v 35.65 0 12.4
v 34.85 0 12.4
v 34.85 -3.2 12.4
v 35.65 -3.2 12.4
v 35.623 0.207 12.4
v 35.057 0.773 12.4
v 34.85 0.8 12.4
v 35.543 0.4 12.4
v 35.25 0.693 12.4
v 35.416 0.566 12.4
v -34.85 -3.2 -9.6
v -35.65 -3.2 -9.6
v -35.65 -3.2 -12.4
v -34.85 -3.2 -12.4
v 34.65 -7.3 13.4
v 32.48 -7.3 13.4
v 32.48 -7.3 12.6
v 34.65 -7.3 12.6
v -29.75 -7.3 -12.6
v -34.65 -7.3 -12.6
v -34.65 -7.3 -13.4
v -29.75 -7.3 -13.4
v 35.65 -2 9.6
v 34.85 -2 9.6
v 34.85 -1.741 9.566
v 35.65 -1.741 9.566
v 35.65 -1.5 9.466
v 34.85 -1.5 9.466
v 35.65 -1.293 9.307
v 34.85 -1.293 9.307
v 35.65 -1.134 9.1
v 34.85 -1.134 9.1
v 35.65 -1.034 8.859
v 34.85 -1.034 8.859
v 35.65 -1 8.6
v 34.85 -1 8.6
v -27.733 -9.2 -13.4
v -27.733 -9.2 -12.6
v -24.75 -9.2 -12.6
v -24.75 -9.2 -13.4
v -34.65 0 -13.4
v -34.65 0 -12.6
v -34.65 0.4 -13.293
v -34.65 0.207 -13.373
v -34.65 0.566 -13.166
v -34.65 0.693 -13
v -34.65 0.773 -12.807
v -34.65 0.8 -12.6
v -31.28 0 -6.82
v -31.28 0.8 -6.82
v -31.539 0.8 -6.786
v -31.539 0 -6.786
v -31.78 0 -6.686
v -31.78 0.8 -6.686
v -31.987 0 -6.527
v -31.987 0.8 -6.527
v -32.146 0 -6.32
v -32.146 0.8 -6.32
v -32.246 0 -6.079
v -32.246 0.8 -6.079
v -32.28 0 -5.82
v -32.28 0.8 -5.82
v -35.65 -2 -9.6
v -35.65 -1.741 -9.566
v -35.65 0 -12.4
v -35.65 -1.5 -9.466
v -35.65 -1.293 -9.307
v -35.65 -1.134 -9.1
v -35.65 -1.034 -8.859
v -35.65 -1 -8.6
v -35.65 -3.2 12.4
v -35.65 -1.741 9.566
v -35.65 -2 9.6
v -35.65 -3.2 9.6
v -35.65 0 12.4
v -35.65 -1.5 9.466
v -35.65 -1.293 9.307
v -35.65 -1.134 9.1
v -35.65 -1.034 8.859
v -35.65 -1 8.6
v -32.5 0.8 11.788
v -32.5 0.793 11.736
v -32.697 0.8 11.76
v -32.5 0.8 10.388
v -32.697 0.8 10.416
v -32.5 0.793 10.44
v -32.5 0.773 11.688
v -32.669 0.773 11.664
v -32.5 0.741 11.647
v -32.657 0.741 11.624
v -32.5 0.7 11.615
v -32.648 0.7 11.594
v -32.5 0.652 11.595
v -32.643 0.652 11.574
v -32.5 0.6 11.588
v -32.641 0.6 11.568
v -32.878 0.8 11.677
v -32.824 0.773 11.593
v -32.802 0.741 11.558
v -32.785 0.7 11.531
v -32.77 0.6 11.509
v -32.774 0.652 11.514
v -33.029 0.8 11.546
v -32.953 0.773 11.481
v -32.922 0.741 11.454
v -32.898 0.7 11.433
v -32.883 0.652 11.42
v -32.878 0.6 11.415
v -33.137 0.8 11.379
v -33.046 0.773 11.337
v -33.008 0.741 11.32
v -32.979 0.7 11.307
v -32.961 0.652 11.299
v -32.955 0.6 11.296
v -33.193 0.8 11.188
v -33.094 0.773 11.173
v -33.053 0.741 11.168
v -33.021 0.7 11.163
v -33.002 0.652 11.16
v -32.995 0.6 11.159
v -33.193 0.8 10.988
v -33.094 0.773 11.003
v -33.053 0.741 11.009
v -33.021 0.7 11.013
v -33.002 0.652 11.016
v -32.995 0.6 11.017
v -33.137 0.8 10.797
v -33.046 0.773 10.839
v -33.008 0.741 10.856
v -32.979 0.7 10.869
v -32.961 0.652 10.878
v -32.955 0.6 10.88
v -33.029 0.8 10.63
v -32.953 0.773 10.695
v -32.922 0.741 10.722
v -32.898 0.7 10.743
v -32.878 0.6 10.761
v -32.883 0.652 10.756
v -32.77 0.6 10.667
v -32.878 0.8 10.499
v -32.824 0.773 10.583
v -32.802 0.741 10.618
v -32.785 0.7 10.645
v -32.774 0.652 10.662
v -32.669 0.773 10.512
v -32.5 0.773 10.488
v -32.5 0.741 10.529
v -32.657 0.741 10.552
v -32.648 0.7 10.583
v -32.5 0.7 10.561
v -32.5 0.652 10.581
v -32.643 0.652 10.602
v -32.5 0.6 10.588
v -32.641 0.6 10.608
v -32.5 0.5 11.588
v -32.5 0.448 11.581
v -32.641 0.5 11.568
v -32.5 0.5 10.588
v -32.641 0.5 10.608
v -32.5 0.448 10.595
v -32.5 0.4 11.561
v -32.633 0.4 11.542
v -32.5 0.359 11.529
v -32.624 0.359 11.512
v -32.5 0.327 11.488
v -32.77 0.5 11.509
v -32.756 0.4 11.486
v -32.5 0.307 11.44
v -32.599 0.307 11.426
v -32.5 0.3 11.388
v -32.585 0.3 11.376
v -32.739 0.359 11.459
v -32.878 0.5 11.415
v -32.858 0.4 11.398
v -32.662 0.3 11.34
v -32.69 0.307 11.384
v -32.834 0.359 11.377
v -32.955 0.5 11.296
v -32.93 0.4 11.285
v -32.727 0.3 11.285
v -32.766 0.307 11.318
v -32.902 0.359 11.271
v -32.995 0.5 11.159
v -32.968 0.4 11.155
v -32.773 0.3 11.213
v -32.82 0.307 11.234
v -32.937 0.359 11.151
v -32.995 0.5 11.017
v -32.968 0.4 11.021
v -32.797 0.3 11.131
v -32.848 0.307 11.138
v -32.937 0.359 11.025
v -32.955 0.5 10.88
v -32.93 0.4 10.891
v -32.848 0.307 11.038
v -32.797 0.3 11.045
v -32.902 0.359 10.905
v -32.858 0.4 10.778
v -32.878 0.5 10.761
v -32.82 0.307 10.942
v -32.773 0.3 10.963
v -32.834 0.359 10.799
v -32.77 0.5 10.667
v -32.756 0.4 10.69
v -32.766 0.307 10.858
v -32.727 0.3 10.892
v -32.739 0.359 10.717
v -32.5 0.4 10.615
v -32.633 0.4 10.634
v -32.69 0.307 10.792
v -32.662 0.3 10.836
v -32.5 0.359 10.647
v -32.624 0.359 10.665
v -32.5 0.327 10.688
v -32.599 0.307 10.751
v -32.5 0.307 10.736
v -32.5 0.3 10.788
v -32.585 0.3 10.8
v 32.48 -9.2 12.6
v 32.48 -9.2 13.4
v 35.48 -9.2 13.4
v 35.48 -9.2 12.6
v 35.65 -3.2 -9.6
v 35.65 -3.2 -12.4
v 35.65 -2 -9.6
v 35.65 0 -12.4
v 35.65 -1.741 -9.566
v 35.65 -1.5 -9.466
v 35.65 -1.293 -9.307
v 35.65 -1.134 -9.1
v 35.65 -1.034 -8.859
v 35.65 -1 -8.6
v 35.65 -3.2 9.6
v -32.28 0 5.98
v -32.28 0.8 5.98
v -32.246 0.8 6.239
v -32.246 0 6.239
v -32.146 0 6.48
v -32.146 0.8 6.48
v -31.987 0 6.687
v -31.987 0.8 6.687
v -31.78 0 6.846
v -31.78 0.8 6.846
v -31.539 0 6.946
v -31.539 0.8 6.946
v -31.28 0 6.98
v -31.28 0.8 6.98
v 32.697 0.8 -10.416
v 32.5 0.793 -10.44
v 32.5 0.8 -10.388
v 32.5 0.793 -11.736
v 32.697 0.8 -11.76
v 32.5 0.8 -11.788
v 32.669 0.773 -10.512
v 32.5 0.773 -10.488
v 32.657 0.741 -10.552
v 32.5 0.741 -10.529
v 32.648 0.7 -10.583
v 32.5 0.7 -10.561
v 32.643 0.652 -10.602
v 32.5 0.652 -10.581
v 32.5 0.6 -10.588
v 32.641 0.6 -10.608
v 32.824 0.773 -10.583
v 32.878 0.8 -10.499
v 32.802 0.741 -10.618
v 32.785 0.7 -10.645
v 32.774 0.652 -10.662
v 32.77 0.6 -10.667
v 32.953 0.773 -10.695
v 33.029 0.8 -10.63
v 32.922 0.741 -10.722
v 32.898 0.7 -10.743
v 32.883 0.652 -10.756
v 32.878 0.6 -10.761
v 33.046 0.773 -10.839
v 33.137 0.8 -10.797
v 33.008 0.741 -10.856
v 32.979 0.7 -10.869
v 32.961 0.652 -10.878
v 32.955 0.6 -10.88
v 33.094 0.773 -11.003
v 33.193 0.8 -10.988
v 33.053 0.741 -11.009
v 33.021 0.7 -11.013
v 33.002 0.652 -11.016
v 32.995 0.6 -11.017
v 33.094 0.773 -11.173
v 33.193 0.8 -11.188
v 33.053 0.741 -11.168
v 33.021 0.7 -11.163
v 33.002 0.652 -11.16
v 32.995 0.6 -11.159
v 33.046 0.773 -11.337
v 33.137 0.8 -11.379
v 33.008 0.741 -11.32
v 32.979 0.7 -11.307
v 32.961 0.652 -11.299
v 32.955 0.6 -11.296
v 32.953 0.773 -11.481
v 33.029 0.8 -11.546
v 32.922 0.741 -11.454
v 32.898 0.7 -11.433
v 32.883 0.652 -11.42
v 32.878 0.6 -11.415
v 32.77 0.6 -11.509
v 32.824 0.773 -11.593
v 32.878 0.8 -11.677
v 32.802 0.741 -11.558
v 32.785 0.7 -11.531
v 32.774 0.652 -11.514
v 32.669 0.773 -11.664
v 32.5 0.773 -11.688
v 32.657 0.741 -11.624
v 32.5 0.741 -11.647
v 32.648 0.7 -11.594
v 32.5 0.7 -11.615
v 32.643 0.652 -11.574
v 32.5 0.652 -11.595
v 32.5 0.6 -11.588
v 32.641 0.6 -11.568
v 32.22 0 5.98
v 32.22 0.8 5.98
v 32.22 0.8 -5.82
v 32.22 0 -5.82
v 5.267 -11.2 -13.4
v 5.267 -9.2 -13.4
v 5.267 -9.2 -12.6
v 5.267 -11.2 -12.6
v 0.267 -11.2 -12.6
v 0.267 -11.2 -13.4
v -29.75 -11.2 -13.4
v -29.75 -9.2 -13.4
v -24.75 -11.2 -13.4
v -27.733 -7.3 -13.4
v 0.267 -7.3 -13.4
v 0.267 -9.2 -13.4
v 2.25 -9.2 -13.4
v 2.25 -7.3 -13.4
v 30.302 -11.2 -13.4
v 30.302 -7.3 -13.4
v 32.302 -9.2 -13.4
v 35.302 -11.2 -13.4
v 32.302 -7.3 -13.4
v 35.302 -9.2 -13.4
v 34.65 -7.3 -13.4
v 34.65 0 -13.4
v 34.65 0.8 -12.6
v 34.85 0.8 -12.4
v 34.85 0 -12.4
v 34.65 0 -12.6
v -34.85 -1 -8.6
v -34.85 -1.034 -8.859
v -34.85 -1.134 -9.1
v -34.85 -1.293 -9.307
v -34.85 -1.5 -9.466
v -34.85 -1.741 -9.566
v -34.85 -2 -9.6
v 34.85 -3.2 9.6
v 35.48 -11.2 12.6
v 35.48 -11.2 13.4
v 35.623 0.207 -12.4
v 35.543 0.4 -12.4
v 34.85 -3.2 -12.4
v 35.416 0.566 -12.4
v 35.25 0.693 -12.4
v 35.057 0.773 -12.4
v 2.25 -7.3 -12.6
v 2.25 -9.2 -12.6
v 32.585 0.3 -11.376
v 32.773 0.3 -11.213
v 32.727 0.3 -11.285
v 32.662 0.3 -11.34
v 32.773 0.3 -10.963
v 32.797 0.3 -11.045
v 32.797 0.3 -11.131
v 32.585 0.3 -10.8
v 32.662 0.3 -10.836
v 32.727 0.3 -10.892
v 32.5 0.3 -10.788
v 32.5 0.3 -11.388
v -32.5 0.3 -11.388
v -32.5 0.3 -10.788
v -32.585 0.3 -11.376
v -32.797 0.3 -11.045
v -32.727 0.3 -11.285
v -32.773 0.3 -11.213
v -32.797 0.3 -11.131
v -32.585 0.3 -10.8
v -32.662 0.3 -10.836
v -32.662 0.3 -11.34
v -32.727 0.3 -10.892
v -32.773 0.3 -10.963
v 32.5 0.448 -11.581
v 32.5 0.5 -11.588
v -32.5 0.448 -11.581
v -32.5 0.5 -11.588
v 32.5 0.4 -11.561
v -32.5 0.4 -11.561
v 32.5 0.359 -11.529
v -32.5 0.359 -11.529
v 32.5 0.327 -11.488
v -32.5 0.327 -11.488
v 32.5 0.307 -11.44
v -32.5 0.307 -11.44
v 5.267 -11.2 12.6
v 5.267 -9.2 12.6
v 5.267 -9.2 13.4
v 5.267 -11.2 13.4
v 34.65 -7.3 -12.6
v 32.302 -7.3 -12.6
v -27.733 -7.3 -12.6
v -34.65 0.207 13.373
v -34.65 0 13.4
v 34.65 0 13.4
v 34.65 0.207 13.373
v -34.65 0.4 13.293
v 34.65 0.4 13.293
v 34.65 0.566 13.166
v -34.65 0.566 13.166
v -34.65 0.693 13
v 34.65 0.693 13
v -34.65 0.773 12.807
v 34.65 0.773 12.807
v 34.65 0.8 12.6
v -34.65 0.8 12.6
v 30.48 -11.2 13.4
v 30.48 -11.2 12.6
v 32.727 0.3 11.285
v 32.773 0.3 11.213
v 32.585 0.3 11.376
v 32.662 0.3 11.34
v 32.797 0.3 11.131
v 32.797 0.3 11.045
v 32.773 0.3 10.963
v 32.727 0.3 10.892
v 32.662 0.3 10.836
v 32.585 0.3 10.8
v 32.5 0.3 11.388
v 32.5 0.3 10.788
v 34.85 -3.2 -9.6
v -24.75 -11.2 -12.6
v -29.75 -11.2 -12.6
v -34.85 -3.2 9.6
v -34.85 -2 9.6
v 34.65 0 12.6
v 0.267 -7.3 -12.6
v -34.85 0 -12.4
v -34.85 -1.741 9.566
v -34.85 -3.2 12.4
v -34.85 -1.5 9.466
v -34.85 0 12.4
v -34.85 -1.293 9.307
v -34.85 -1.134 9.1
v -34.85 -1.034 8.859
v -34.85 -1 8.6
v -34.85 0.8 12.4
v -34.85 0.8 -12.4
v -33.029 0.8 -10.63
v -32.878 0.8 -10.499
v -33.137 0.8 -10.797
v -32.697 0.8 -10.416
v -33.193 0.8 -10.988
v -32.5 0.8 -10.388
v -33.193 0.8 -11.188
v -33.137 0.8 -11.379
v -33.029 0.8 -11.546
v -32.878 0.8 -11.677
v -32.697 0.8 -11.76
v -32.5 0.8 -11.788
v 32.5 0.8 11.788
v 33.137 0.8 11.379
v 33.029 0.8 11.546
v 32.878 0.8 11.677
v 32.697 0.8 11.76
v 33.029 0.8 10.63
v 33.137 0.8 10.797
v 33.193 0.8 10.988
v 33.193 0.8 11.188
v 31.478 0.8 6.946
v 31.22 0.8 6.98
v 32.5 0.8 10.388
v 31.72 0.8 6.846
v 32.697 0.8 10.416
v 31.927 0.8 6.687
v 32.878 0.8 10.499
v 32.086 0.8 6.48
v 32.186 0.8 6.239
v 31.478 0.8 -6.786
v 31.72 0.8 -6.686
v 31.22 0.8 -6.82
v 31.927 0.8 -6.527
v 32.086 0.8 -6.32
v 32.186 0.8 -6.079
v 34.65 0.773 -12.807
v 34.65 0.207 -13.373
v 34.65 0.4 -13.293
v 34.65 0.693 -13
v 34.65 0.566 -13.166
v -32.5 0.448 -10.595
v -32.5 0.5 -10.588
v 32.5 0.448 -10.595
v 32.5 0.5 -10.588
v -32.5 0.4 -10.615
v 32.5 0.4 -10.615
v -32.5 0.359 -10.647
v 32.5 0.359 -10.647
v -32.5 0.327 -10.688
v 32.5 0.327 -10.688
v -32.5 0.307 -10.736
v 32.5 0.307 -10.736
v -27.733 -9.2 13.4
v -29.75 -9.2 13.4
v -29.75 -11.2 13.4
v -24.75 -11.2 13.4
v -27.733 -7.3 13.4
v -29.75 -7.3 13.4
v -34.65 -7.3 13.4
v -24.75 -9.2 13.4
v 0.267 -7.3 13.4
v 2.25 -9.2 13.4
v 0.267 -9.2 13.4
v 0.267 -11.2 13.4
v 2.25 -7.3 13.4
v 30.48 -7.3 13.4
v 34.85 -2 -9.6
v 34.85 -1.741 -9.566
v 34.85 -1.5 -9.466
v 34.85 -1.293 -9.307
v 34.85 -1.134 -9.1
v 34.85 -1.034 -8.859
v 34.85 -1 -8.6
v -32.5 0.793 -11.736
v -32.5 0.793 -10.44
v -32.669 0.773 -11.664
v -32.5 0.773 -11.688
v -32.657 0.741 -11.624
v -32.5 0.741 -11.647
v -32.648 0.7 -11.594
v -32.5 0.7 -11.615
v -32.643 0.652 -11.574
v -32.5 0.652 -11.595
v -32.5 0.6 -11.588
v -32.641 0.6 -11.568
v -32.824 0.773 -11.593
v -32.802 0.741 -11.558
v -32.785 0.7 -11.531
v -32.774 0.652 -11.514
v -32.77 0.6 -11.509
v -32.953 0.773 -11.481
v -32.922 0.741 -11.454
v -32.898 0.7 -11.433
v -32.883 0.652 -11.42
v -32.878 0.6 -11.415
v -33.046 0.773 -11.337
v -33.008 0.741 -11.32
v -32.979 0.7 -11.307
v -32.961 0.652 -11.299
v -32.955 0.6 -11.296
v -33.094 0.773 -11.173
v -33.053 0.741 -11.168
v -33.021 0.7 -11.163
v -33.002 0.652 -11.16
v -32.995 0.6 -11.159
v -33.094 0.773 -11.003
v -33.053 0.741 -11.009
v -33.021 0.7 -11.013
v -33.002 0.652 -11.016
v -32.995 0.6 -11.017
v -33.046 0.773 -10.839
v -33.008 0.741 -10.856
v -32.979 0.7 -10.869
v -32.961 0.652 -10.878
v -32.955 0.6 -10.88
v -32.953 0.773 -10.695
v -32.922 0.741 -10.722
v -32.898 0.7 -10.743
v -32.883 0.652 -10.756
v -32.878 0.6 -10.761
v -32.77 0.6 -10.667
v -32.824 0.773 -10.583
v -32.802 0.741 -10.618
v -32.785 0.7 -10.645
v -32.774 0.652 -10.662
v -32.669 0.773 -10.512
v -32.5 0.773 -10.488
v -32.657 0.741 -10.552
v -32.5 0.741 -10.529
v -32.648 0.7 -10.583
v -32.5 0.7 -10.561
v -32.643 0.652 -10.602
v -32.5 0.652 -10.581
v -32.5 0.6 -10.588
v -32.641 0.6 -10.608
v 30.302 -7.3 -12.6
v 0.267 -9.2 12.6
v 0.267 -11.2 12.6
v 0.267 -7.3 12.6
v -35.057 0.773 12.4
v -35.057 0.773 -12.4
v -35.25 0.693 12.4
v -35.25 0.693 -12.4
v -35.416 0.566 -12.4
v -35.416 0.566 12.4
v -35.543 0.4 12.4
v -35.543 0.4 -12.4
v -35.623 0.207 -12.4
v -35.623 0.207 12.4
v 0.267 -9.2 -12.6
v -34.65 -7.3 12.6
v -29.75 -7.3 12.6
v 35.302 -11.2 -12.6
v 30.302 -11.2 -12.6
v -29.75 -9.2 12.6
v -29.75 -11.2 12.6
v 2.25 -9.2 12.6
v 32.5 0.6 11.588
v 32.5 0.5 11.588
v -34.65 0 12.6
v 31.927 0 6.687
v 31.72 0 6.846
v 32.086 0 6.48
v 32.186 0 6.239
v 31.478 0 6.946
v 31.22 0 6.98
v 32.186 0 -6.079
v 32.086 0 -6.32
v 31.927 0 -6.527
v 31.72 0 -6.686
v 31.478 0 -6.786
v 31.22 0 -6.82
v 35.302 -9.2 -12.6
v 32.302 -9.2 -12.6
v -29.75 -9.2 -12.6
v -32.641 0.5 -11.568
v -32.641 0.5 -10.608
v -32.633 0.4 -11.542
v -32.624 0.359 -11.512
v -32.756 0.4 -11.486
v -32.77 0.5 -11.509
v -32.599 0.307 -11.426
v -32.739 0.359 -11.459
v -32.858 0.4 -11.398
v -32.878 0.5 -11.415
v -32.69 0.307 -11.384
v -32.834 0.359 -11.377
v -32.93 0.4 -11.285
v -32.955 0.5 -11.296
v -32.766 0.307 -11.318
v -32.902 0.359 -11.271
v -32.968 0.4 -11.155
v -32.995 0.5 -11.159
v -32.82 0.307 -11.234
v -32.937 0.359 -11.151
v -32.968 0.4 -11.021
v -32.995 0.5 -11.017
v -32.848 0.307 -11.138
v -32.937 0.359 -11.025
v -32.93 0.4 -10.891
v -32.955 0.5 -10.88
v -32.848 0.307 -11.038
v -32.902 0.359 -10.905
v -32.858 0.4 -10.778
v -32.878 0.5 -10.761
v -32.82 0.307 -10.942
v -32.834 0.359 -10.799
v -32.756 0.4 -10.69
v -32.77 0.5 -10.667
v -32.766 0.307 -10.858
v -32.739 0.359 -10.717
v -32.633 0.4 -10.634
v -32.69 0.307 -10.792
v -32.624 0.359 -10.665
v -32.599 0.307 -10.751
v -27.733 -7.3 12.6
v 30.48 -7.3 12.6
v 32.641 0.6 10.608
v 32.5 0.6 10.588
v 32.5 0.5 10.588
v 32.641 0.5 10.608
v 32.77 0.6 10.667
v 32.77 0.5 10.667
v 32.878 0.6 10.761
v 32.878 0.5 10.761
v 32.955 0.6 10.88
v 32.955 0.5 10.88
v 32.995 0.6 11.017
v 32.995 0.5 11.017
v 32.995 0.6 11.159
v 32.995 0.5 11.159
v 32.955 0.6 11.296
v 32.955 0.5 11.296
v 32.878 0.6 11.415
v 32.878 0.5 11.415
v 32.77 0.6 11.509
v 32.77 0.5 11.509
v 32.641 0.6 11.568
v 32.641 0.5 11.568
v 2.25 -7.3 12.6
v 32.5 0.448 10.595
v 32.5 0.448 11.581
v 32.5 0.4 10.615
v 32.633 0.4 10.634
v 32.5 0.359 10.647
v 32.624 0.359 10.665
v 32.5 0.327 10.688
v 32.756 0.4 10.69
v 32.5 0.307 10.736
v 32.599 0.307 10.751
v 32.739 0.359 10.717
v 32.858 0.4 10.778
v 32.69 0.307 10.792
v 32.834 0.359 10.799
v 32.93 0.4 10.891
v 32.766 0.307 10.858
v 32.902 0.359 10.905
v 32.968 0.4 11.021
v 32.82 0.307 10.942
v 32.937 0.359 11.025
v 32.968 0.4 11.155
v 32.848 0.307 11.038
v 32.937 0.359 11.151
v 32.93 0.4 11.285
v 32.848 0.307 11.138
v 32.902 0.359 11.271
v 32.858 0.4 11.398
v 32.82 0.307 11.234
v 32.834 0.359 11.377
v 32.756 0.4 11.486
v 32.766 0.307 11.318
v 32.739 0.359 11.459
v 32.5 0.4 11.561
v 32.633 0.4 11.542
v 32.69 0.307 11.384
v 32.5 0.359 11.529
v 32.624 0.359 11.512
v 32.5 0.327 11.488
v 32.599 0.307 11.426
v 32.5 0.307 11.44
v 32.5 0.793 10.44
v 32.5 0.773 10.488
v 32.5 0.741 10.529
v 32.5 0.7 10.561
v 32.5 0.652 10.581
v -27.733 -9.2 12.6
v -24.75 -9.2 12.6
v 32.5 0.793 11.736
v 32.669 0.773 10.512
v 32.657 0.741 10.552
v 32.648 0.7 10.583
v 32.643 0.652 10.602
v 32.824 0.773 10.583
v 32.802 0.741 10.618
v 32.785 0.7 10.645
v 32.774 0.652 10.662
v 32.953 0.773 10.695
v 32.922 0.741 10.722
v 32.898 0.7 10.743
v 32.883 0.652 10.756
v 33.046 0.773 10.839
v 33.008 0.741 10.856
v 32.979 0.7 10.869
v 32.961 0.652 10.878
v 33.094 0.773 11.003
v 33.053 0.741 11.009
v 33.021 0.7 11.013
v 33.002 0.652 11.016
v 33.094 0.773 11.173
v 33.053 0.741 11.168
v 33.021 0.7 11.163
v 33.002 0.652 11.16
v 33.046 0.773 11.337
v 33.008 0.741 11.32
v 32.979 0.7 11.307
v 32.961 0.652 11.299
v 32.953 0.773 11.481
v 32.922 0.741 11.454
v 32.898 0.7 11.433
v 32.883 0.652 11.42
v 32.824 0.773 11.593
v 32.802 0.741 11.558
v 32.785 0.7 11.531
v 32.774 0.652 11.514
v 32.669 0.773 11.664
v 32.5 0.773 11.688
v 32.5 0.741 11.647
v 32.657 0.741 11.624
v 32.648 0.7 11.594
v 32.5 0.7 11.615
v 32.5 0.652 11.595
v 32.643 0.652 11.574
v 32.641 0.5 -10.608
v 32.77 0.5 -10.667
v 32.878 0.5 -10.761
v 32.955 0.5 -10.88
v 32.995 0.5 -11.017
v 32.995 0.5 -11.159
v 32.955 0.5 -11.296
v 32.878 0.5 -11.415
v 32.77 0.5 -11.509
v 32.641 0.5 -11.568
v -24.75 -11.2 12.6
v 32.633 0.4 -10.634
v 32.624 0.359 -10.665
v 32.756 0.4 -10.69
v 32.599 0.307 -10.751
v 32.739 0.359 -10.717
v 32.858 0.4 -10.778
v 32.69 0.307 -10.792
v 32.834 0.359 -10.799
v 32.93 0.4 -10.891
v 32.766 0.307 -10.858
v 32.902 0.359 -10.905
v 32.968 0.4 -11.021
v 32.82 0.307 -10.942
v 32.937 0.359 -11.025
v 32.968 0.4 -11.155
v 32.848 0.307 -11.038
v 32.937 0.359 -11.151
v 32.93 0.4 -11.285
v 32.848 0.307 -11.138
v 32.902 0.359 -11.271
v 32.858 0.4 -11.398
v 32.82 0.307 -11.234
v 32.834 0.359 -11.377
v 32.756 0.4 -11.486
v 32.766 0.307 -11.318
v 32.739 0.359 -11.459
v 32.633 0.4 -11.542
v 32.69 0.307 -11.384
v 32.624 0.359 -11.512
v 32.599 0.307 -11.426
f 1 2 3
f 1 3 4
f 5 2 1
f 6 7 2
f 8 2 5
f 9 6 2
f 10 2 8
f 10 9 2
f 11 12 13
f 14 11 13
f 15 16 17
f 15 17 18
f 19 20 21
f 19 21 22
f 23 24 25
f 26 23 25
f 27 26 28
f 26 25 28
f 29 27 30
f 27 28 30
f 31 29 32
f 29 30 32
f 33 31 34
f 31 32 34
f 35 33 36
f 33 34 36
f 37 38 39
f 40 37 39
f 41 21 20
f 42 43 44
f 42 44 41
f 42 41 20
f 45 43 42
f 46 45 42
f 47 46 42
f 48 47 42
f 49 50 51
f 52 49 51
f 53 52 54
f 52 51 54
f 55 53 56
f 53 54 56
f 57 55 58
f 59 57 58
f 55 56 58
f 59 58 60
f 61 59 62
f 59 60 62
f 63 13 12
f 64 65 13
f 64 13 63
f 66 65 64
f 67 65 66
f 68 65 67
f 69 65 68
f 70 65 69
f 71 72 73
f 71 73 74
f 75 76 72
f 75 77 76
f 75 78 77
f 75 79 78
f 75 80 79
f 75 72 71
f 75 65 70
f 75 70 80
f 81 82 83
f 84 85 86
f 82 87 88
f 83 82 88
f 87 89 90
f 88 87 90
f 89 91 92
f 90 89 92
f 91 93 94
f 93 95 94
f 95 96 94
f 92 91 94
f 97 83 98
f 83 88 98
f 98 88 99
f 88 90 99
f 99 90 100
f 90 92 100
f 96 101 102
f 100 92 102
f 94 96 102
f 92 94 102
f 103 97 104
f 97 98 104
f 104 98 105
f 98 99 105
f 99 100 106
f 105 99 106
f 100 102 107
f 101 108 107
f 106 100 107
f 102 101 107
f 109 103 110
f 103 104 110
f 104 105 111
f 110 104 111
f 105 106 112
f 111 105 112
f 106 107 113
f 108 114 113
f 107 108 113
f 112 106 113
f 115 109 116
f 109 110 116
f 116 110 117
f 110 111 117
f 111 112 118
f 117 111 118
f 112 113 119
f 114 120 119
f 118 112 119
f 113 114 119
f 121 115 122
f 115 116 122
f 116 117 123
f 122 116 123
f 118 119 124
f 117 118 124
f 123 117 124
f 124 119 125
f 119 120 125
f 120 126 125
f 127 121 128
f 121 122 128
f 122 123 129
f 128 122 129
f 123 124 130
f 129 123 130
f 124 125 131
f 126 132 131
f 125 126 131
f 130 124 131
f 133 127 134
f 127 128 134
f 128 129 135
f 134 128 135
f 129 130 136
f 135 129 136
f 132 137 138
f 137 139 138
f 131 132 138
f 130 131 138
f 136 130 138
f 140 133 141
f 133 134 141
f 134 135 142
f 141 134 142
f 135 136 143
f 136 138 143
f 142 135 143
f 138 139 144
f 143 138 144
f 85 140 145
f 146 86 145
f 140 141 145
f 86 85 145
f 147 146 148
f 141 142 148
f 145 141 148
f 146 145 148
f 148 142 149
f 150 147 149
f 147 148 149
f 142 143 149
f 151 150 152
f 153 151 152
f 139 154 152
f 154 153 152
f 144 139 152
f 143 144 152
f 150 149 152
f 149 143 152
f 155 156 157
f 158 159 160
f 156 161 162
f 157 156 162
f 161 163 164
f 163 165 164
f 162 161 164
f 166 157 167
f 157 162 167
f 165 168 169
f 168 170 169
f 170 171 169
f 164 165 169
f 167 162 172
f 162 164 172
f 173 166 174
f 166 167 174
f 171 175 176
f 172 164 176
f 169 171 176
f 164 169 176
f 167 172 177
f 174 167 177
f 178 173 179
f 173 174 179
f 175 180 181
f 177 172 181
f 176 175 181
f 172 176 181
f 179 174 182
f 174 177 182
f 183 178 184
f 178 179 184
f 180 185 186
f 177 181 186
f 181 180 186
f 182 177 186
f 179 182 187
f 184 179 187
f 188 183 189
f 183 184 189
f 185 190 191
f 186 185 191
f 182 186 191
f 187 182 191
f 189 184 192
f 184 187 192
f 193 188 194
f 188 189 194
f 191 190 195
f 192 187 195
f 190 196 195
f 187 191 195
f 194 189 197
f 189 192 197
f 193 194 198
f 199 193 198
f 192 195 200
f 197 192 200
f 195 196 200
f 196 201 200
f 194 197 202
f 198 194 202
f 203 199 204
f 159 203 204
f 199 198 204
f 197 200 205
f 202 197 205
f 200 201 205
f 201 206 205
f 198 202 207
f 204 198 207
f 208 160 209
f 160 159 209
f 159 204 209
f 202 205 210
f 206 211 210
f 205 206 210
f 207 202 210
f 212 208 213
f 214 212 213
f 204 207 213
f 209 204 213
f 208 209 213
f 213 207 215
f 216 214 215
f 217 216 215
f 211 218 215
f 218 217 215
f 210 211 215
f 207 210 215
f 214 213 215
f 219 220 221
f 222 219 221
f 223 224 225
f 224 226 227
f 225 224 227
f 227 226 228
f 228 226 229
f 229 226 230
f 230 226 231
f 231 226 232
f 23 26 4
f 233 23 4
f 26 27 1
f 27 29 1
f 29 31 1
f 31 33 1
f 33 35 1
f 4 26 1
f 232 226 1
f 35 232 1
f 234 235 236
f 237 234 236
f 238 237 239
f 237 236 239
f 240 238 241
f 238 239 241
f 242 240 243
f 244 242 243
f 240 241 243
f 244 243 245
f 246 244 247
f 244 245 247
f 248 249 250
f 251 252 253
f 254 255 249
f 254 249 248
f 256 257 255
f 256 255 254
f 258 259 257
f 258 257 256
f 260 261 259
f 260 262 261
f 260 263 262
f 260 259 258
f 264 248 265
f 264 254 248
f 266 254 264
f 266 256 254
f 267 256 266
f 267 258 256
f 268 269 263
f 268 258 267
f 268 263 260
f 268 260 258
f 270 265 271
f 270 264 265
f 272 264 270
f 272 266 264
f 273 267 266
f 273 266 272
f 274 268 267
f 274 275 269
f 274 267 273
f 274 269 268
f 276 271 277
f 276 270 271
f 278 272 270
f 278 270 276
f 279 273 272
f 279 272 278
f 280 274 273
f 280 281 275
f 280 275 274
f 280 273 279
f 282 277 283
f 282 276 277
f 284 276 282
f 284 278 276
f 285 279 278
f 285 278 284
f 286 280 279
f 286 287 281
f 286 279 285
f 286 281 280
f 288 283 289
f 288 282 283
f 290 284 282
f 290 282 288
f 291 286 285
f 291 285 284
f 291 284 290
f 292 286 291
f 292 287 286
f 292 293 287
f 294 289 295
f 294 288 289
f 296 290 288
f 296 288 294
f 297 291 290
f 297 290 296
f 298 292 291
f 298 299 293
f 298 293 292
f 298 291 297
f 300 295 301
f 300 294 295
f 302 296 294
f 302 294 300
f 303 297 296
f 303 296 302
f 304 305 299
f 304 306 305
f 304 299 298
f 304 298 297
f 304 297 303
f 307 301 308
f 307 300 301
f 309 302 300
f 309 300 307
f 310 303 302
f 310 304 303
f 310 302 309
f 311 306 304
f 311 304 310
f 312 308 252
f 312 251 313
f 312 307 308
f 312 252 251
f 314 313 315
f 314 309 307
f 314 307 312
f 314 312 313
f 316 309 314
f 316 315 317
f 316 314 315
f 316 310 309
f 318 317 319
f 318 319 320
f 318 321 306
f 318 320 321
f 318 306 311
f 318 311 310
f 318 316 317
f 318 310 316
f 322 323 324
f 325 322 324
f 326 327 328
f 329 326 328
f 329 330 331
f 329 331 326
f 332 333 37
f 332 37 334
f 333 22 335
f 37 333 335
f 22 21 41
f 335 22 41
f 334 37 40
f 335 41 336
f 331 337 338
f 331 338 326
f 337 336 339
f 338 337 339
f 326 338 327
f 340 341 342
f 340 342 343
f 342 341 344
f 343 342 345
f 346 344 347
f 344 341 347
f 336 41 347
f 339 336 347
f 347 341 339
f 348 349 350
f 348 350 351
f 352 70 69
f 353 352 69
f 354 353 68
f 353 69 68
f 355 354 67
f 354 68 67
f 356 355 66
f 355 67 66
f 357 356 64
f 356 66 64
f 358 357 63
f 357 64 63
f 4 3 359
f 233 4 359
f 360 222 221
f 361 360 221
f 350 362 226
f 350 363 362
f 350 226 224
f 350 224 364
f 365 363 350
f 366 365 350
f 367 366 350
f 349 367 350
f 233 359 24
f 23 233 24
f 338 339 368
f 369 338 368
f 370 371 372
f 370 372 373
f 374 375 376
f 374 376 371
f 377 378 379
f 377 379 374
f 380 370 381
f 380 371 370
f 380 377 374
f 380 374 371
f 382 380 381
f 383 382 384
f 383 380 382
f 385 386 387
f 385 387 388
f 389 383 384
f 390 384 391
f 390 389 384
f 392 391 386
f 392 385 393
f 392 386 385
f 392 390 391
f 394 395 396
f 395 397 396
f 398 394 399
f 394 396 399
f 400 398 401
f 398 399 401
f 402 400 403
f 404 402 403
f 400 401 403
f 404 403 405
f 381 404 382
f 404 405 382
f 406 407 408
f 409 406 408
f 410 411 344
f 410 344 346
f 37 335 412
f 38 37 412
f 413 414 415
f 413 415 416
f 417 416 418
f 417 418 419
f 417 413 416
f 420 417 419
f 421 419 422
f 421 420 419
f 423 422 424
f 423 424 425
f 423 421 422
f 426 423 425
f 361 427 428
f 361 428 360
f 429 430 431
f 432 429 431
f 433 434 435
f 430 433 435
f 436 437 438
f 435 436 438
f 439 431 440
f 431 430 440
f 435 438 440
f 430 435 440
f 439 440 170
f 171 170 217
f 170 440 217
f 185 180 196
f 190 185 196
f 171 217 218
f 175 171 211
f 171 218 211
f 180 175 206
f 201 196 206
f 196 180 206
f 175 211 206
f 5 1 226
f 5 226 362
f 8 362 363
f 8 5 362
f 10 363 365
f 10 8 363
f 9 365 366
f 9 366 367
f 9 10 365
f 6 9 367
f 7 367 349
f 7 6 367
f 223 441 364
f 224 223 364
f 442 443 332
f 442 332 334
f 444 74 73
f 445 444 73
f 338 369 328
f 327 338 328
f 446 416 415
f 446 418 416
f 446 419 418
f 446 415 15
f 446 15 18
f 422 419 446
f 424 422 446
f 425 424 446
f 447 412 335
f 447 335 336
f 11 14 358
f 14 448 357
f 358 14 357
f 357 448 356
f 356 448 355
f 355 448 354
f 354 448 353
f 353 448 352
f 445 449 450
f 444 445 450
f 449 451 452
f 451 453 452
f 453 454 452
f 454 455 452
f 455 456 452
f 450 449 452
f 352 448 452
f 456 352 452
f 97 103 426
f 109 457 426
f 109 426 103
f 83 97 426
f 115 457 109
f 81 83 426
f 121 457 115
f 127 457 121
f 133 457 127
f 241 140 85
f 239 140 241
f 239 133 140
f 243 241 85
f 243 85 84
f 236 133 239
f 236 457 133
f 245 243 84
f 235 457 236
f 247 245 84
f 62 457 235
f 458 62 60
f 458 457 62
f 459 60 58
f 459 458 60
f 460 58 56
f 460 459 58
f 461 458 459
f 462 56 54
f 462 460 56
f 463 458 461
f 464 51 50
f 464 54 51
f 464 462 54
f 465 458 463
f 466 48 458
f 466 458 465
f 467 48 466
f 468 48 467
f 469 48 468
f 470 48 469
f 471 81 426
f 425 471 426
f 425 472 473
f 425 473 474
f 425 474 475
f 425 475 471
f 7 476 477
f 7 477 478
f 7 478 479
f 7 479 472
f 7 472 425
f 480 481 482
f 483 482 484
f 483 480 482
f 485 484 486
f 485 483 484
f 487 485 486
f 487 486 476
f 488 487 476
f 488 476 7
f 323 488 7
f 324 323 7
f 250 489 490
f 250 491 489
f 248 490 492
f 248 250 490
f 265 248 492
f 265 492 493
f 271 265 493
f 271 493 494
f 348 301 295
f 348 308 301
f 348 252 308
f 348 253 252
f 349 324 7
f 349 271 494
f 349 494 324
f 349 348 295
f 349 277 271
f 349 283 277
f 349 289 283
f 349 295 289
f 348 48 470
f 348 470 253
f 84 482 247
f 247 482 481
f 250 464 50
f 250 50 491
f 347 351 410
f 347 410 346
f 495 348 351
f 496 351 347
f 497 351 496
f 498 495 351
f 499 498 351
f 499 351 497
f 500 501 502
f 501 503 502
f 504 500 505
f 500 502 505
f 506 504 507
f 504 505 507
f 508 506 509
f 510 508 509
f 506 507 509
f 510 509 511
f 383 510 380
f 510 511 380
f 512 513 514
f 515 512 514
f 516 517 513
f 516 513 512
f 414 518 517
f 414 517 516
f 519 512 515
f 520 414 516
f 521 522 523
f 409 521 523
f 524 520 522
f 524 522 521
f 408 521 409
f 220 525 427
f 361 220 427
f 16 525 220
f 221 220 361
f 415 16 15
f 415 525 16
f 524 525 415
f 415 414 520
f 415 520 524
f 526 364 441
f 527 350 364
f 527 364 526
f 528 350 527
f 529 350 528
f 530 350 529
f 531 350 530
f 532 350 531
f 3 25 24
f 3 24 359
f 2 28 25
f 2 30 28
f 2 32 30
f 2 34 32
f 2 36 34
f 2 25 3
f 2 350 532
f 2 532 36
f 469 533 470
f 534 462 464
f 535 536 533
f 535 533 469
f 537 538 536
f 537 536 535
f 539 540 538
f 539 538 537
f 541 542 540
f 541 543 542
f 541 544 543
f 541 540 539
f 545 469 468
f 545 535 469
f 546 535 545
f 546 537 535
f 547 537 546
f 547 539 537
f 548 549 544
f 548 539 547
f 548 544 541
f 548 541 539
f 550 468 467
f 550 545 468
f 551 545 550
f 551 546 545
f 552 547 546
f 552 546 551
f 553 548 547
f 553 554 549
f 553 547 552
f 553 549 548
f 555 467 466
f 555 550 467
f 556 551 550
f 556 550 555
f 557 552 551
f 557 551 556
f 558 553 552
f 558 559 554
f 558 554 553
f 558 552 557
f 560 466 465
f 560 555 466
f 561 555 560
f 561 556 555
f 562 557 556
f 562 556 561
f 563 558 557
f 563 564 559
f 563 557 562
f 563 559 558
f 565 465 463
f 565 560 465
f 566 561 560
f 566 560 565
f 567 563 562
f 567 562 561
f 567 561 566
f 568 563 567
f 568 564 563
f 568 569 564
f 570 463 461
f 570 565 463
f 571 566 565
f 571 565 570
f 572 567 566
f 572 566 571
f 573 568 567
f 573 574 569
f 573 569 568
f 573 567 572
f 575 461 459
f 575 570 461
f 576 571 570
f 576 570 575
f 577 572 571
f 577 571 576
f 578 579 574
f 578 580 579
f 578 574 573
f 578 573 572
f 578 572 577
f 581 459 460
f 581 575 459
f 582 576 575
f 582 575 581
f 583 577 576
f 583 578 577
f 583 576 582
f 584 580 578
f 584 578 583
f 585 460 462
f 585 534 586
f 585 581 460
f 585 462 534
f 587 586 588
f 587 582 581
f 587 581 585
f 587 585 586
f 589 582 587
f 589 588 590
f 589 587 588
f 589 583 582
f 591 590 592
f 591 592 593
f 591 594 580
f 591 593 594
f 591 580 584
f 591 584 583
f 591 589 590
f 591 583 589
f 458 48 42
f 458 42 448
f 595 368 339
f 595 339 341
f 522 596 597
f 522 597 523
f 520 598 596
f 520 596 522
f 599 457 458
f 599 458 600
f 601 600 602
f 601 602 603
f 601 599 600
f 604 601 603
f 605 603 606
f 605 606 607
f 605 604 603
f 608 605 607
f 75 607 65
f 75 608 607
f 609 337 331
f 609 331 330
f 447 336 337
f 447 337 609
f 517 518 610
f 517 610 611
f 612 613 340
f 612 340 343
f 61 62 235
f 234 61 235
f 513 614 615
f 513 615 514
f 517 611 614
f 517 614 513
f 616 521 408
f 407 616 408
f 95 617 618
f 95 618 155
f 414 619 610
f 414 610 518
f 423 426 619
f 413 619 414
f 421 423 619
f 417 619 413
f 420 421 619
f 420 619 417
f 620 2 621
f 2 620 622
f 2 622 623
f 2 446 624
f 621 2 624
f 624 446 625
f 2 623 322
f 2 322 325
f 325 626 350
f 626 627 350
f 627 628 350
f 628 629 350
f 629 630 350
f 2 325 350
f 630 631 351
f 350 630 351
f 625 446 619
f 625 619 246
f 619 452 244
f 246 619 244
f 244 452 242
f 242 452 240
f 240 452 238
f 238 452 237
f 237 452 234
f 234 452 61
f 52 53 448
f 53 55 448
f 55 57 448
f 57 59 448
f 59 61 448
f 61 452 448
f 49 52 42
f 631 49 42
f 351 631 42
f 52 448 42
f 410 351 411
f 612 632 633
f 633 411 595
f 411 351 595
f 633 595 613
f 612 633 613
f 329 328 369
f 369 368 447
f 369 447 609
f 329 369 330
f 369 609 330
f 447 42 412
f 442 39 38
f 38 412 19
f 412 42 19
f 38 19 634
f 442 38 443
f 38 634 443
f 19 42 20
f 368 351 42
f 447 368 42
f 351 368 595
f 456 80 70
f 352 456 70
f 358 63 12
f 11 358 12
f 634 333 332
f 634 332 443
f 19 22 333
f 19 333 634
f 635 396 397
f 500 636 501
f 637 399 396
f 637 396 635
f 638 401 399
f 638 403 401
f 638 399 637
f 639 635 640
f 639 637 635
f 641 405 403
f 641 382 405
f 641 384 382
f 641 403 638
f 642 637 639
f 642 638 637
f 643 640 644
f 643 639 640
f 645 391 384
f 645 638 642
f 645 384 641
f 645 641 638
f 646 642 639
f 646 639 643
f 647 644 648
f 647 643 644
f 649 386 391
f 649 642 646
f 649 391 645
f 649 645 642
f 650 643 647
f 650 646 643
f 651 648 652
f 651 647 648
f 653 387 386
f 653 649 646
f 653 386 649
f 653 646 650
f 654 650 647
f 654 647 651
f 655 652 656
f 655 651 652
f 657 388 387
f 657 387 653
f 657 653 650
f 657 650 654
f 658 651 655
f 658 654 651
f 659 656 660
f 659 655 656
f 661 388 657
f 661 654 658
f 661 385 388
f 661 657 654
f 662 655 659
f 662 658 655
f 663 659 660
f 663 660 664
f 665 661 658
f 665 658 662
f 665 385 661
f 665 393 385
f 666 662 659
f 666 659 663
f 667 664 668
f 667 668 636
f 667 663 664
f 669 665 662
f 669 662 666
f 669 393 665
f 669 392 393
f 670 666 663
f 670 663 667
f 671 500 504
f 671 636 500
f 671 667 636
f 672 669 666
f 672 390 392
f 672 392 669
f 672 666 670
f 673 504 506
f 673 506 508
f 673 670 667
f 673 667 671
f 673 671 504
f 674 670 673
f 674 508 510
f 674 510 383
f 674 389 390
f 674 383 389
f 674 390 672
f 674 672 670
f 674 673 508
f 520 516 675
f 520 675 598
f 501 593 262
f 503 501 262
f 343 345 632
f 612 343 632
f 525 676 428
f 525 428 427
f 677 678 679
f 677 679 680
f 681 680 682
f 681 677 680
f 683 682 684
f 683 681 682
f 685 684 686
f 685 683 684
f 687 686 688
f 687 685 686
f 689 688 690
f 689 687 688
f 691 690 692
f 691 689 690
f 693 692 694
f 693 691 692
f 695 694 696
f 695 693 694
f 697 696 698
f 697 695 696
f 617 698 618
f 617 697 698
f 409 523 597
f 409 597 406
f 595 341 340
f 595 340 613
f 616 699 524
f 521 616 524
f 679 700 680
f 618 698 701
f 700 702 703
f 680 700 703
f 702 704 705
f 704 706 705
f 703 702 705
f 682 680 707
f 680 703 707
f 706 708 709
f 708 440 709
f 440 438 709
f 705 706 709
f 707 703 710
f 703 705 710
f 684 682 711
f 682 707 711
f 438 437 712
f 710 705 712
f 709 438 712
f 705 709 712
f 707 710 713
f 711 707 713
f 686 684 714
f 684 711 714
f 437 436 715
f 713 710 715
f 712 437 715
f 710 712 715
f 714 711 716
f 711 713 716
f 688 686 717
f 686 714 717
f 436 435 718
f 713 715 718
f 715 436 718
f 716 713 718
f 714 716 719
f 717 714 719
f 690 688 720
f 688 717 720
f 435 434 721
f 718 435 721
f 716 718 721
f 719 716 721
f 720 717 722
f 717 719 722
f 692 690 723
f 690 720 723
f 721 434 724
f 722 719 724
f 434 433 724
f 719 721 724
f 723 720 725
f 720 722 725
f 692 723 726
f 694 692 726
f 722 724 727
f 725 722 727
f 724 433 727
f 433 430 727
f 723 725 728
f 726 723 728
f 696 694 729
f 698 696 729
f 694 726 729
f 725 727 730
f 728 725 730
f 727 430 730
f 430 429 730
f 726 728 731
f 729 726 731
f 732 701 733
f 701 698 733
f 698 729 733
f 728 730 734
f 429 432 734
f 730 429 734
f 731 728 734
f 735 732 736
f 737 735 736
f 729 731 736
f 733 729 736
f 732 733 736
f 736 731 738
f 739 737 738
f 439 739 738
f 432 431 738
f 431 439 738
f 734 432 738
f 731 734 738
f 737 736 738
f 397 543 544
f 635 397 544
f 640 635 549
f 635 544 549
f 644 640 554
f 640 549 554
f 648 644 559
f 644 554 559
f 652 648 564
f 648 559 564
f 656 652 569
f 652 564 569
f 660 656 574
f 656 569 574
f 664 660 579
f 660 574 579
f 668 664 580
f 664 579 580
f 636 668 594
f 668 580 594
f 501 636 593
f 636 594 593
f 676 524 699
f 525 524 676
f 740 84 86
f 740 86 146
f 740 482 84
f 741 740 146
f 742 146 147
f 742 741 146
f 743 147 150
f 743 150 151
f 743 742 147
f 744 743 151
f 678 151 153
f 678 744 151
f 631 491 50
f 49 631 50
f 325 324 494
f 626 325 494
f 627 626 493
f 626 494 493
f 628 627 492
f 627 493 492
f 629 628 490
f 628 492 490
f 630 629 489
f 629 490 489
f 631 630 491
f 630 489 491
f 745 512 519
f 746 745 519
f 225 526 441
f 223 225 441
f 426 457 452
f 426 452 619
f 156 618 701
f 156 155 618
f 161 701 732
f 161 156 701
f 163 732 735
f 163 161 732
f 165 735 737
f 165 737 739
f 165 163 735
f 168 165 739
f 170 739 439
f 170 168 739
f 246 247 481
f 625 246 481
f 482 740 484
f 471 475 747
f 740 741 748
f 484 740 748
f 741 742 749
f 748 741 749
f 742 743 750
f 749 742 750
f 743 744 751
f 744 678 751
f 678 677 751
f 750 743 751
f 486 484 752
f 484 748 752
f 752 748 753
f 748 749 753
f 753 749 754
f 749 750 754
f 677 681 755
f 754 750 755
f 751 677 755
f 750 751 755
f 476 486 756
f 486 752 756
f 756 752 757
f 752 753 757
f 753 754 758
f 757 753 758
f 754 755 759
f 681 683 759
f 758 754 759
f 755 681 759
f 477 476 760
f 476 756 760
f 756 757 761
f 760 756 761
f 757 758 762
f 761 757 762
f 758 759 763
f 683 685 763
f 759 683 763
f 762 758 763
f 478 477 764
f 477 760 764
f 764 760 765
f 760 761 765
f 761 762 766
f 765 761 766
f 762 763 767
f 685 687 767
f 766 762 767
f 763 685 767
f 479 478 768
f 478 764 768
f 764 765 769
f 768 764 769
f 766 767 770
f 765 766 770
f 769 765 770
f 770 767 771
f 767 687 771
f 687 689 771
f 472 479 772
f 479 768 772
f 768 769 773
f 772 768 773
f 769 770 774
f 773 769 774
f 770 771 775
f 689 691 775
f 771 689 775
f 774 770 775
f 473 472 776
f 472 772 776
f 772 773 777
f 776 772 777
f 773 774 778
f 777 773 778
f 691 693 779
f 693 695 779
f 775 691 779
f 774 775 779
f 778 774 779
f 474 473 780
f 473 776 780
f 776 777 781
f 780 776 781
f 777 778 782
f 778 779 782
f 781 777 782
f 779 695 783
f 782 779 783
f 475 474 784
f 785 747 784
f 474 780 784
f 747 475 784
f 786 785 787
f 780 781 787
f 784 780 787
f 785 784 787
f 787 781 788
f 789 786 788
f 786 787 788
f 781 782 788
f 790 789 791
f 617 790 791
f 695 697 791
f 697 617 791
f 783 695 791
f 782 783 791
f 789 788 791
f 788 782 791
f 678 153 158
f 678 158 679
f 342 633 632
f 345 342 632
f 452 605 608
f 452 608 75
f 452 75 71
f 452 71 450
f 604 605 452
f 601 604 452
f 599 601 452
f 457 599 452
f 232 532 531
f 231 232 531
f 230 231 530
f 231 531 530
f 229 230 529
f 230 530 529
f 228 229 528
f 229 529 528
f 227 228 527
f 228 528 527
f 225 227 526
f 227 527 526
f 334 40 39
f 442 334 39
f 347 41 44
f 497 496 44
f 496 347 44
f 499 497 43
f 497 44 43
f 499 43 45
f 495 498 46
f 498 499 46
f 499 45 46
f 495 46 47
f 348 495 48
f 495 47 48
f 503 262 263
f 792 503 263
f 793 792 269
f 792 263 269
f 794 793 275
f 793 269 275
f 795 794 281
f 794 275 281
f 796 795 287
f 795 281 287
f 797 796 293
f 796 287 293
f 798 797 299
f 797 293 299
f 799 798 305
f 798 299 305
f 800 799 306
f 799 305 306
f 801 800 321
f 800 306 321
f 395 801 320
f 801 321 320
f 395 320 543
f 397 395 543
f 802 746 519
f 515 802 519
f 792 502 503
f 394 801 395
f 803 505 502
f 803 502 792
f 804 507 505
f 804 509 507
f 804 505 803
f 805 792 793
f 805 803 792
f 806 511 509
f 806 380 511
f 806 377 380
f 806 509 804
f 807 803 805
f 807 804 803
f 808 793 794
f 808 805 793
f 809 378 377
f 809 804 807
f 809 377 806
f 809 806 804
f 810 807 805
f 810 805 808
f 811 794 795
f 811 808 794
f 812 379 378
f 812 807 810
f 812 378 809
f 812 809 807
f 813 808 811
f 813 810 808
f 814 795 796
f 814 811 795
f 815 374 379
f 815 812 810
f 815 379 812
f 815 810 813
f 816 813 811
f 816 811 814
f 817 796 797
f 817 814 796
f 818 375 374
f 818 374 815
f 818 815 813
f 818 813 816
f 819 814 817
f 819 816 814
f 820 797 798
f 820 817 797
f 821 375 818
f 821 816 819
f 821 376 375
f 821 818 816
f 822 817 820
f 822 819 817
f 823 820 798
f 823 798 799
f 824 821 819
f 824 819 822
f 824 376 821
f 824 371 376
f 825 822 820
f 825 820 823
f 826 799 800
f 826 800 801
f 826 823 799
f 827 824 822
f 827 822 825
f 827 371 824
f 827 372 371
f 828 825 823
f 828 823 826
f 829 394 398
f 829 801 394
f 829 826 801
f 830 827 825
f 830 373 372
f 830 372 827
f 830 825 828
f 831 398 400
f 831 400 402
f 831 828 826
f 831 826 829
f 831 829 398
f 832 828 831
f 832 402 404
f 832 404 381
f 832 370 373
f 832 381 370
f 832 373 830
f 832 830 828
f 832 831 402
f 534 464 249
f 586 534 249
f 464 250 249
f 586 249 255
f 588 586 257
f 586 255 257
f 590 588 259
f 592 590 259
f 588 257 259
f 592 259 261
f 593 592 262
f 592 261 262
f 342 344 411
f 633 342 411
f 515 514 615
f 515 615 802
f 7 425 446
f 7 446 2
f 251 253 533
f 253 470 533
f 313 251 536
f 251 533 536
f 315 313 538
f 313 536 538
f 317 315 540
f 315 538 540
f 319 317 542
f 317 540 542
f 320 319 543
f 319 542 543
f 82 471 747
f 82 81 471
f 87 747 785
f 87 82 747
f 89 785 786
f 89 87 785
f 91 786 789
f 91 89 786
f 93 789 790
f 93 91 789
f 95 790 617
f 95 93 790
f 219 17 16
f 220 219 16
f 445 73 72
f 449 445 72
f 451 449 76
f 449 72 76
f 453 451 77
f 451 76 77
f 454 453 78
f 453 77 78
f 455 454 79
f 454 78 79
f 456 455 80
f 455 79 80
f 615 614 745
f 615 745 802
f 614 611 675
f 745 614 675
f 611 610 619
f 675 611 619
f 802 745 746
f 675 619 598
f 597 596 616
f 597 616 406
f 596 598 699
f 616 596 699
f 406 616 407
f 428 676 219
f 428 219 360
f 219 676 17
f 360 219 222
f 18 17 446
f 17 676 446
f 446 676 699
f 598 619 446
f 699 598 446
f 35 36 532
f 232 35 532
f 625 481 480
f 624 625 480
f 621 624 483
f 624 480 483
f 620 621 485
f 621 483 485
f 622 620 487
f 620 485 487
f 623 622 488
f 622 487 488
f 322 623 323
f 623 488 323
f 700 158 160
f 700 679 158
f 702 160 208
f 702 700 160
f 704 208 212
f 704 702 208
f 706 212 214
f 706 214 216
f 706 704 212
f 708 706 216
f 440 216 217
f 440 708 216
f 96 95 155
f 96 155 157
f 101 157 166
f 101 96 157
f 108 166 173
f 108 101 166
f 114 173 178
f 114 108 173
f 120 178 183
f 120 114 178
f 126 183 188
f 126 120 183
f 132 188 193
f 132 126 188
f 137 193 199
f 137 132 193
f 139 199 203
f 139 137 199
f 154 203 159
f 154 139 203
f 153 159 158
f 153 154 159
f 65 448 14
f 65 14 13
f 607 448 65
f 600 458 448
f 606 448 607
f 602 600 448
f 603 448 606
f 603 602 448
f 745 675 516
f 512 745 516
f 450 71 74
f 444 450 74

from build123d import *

# Parameters (mm, degrees)
SKETCH1_W            = 71.3
SKETCH1_H            = 26.8
BOSS_EXTRUDE1_DEPTH  = 0.8
SKETCH2_W            = 71.3
SKETCH2_H            = 26.8
SKETCH2_W_2          = 69.7
SKETCH2_H_2          = 25.2
BOSS_EXTRUDE2_DEPTH  = 7.3
CUT_EXTRUDE1_DEPTH   = 73.91460759
CUT_EXTRUDE4_DEPTH   = 46.193500639
CUT_EXTRUDE5_DEPTH   = 39.937032501
SKETCH13_W           = 2
SKETCH13_H           = 0.8
SKETCH13_W_2         = 1.982692709
SKETCH13_W_3         = 2.017307291
BITIS_DEPTH          = 1.9
SKETCH14_W           = 5
SKETCH14_H           = 0.8
COKOR_DEPTH          = 2
CUT_EXTRUDE6_DEPTH   = 0.5
FILLET1_R            = 0.2
FILLET1_OF_MIRROR1_R = 0.2
CUT_EXTRUDE7_REACH   = 41.931


with BuildPart() as part:
    # Sketch1 → Boss-Extrude1 (new body)
    with BuildSketch(Plane(origin=(0, 0, 0), x_dir=(1, 0, 0), z_dir=(0, 1, 0))):
        Rectangle(SKETCH1_W, SKETCH1_H)
    extrude(amount=BOSS_EXTRUDE1_DEPTH)

    # Sketch2 → Boss-Extrude2 (add)
    with BuildSketch(Plane.XZ):
        Rectangle(SKETCH2_W, SKETCH2_H)
        Rectangle(SKETCH2_W_2, SKETCH2_H_2, mode=Mode.SUBTRACT)
    extrude(amount=BOSS_EXTRUDE2_DEPTH)

    # Sketch5 → Cut-Extrude1 (cut, through all)
    with BuildSketch(Plane.ZY.offset(35.65)):
        with BuildLine():
            Line((-12.4, 0), (-12.6, 0))
            Line((-12.6, 0), (-12.6, -7.3))
            Line((-12.6, -7.3), (12.6, -7.3))
            Line((12.6, -7.3), (12.6, 0))
            Line((12.6, 0), (12.4, 0))
            Line((12.4, 0), (12.4, -3.2))
            Line((12.4, -3.2), (9.6, -3.2))
            Line((9.6, -3.2), (9.6, -2))
            ThreePointArc((9.6, -2), (9.307106781, -1.292893219), (8.6, -1))
            Line((8.6, -1), (-8.6, -1))
            ThreePointArc((-8.6, -1), (-9.307106781, -1.292893219), (-9.6, -2))
            Line((-9.6, -2), (-9.6, -3.2))
            Line((-9.6, -3.2), (-12.4, -3.2))
            Line((-12.4, -3.2), (-12.4, 0))
        make_face()
        with BuildLine():
            Line((13.4, 0.8), (13.4, 0))
            ThreePointArc((13.4, 0), (13.165685425, 0.565685425), (12.6, 0.8))
            Line((12.6, 0.8), (13.4, 0.8))
        make_face()
        with BuildLine():
            Line((-12.6, 0.8), (-13.4, 0.8))
            Line((-13.4, 0.8), (-13.4, 0))
            ThreePointArc((-13.4, 0), (-13.165685425, 0.565685425), (-12.6, 0.8))
        make_face()
    extrude(amount=-CUT_EXTRUDE1_DEPTH, mode=Mode.SUBTRACT)

    # Sketch9 → Cut-Extrude4 (cut, through all)
    with BuildSketch(Plane.XY.offset(13.4)):
        with BuildLine():
            ThreePointArc((-34.85, 0.8), (-35.415685425, 0.565685425), (-35.65, 0))
            Line((-35.65, 0), (-35.65, 0.8))
            Line((-35.65, 0.8), (-34.85, 0.8))
        make_face()
        Polygon((-34.65, 0), (-34.85, 0), (-34.85, -3.2), (-35.65, -3.2), (-35.65, -7.3), (-34.65, -7.3), align=None)
        Polygon((34.85, 0), (34.65, 0), (34.65, -7.3), (35.65, -7.3), (35.65, -3.2), (34.85, -3.2), align=None)
        with BuildLine():
            Line((35.65, 0.8), (35.65, 0))
            ThreePointArc((35.65, 0), (35.415685425, 0.565685425), (34.85, 0.8))
            Line((34.85, 0.8), (35.65, 0.8))
        make_face()
    extrude(amount=-CUT_EXTRUDE4_DEPTH, mode=Mode.SUBTRACT)

    # Sketch10 → Cut-Extrude5 (cut, through all)
    with BuildSketch(Plane(origin=(0, 0.8, 0), x_dir=(1, 0, 0), z_dir=(0, 1, 0))):
        Polygon((-34.65, -12.6), (-34.65, -13.4), (-35.65, -13.4), (-35.65, -12.4), (-34.85, -12.4), align=None)
        Polygon((35.65, -13.4), (34.65, -13.4), (34.65, -12.6), (34.85, -12.4), (35.65, -12.4), align=None)
        Polygon((34.65, 12.6), (34.65, 13.4), (35.65, 13.4), (35.65, 12.4), (34.85, 12.4), align=None)
        Polygon((-35.65, 13.4), (-34.65, 13.4), (-34.65, 12.6), (-34.85, 12.4), (-35.65, 12.4), align=None)
    extrude(amount=-CUT_EXTRUDE5_DEPTH, mode=Mode.SUBTRACT)

    # Sketch13 → Bitis (add)
    with BuildSketch(Plane.XZ.offset(7.3)):
        with Locations((31.479809087, 13)):
            Rectangle(SKETCH13_W, SKETCH13_H)
        with Locations((31.302010091, -13)):
            Rectangle(SKETCH13_W, SKETCH13_H)
        with Locations((1.258653645, -13)):
            Rectangle(SKETCH13_W_2, SKETCH13_H)
        with Locations((-28.741346355, 13)):
            Rectangle(SKETCH13_W_3, SKETCH13_H)
        with Locations((1.258653645, 13)):
            Rectangle(SKETCH13_W_2, SKETCH13_H)
        with Locations((-28.741346355, -13)):
            Rectangle(SKETCH13_W_3, SKETCH13_H)
    extrude(amount=BITIS_DEPTH)

    # Sketch14 → Cokor (add)
    with BuildSketch(Plane.XZ.offset(9.2)):
        with Locations((-27.25, 13)):
            Rectangle(SKETCH14_W, SKETCH14_H)
        with Locations((2.767307291, -13)):
            Rectangle(SKETCH14_W, SKETCH14_H)
        with Locations((-27.25, -13)):
            Rectangle(SKETCH14_W, SKETCH14_H)
        with Locations((2.767307291, 13)):
            Rectangle(SKETCH14_W, SKETCH14_H)
        with Locations((32.979809087, 13)):
            Rectangle(SKETCH14_W, SKETCH14_H)
        with Locations((32.802010091, -13)):
            Rectangle(SKETCH14_W, SKETCH14_H)
    extrude(amount=COKOR_DEPTH)

    # Sketch15 → Cut-Extrude6 (cut)
    with BuildSketch(Plane(origin=(0, 0.8, 0), x_dir=(1, 0, 0), z_dir=(0, 1, 0))):
        with BuildLine():
            Line((-32.5, -10.588064309), (32.5, -10.588064309))
            ThreePointArc((32.5, -10.588064309), (33, -11.088064309), (32.5, -11.588064309))
            Line((32.5, -11.588064309), (-32.5, -11.588064309))
            ThreePointArc((-32.5, -11.588064309), (-33, -11.088064309), (-32.5, -10.588064309))
        make_face()
    cut_extrude6 = extrude(amount=-CUT_EXTRUDE6_DEPTH, mode=Mode.SUBTRACT)

    # Fillet1
    fillet1_edges = [part.edges().sort_by_distance(p)[0] for p in [
        (-33, 0.3, 11.088064309),
        (0, 0.3, 10.588064309),
        (33, 0.3, 11.088064309),
        (0, 0.3, 11.588064309),
        (-33, 0.8, 11.088064309),
        (0, 0.8, 11.588064309),
        (33, 0.8, 11.088064309),
        (0, 0.8, 10.588064309),
    ]]
    fillet(fillet1_edges, radius=FILLET1_R)

    # Mirror1: Cut-Extrude6 across plane
    add(cut_extrude6.mirror(Plane.XY), mode=Mode.SUBTRACT)

    # Fillet1 of Mirror1
    fillet1_of_mirror1_edges = [part.edges().sort_by_distance(p)[0] for p in [
        (-33, 0.3, -11.088064309),
        (0, 0.3, -10.588064309),
        (33, 0.3, -11.088064309),
        (0, 0.3, -11.588064309),
        (-33, 0.8, -11.088064309),
        (0, 0.8, -11.588064309),
        (33, 0.8, -11.088064309),
        (0, 0.8, -10.588064309),
    ]]
    fillet(fillet1_of_mirror1_edges, radius=FILLET1_OF_MIRROR1_R)

    # Sketch19 → Cut-Extrude7 (cut, up to next)
    with BuildSketch(Plane(origin=(0, 0.8, 0), x_dir=(1, 0, 0), z_dir=(0, 1, 0)), mode=Mode.PRIVATE) as cut_extrude7_sk1:
        with BuildLine():
            Line((-31.280382084, -6.979906863), (31.219617916, -6.979906863))
            ThreePointArc((31.219617916, -6.979906863), (31.926724698, -6.687013644), (32.219617916, -5.979906863))
            Line((32.219617916, -5.979906863), (32.219617916, 5.820093137))
            ThreePointArc((32.219617916, 5.820093137), (31.926724698, 6.527199918), (31.219617916, 6.820093137))
            Line((31.219617916, 6.820093137), (-31.280382084, 6.820093137))
            ThreePointArc((-31.280382084, 6.820093137), (-31.987488865, 6.527199918), (-32.280382084, 5.820093137))
            Line((-32.280382084, 5.820093137), (-32.280382084, -5.979906863))
            ThreePointArc((-32.280382084, -5.979906863), (-31.987488865, -6.687013644), (-31.280382084, -6.979906863))
        make_face()
    cut_extrude7_tool1 = extrude(cut_extrude7_sk1.sketch, amount=-CUT_EXTRUDE7_REACH, mode=Mode.PRIVATE) & part.part
    add(cut_extrude7_tool1.solids().sort_by_distance((-0.030382, 0.8, 0.079907))[0], mode=Mode.SUBTRACT)


solid = part.part
